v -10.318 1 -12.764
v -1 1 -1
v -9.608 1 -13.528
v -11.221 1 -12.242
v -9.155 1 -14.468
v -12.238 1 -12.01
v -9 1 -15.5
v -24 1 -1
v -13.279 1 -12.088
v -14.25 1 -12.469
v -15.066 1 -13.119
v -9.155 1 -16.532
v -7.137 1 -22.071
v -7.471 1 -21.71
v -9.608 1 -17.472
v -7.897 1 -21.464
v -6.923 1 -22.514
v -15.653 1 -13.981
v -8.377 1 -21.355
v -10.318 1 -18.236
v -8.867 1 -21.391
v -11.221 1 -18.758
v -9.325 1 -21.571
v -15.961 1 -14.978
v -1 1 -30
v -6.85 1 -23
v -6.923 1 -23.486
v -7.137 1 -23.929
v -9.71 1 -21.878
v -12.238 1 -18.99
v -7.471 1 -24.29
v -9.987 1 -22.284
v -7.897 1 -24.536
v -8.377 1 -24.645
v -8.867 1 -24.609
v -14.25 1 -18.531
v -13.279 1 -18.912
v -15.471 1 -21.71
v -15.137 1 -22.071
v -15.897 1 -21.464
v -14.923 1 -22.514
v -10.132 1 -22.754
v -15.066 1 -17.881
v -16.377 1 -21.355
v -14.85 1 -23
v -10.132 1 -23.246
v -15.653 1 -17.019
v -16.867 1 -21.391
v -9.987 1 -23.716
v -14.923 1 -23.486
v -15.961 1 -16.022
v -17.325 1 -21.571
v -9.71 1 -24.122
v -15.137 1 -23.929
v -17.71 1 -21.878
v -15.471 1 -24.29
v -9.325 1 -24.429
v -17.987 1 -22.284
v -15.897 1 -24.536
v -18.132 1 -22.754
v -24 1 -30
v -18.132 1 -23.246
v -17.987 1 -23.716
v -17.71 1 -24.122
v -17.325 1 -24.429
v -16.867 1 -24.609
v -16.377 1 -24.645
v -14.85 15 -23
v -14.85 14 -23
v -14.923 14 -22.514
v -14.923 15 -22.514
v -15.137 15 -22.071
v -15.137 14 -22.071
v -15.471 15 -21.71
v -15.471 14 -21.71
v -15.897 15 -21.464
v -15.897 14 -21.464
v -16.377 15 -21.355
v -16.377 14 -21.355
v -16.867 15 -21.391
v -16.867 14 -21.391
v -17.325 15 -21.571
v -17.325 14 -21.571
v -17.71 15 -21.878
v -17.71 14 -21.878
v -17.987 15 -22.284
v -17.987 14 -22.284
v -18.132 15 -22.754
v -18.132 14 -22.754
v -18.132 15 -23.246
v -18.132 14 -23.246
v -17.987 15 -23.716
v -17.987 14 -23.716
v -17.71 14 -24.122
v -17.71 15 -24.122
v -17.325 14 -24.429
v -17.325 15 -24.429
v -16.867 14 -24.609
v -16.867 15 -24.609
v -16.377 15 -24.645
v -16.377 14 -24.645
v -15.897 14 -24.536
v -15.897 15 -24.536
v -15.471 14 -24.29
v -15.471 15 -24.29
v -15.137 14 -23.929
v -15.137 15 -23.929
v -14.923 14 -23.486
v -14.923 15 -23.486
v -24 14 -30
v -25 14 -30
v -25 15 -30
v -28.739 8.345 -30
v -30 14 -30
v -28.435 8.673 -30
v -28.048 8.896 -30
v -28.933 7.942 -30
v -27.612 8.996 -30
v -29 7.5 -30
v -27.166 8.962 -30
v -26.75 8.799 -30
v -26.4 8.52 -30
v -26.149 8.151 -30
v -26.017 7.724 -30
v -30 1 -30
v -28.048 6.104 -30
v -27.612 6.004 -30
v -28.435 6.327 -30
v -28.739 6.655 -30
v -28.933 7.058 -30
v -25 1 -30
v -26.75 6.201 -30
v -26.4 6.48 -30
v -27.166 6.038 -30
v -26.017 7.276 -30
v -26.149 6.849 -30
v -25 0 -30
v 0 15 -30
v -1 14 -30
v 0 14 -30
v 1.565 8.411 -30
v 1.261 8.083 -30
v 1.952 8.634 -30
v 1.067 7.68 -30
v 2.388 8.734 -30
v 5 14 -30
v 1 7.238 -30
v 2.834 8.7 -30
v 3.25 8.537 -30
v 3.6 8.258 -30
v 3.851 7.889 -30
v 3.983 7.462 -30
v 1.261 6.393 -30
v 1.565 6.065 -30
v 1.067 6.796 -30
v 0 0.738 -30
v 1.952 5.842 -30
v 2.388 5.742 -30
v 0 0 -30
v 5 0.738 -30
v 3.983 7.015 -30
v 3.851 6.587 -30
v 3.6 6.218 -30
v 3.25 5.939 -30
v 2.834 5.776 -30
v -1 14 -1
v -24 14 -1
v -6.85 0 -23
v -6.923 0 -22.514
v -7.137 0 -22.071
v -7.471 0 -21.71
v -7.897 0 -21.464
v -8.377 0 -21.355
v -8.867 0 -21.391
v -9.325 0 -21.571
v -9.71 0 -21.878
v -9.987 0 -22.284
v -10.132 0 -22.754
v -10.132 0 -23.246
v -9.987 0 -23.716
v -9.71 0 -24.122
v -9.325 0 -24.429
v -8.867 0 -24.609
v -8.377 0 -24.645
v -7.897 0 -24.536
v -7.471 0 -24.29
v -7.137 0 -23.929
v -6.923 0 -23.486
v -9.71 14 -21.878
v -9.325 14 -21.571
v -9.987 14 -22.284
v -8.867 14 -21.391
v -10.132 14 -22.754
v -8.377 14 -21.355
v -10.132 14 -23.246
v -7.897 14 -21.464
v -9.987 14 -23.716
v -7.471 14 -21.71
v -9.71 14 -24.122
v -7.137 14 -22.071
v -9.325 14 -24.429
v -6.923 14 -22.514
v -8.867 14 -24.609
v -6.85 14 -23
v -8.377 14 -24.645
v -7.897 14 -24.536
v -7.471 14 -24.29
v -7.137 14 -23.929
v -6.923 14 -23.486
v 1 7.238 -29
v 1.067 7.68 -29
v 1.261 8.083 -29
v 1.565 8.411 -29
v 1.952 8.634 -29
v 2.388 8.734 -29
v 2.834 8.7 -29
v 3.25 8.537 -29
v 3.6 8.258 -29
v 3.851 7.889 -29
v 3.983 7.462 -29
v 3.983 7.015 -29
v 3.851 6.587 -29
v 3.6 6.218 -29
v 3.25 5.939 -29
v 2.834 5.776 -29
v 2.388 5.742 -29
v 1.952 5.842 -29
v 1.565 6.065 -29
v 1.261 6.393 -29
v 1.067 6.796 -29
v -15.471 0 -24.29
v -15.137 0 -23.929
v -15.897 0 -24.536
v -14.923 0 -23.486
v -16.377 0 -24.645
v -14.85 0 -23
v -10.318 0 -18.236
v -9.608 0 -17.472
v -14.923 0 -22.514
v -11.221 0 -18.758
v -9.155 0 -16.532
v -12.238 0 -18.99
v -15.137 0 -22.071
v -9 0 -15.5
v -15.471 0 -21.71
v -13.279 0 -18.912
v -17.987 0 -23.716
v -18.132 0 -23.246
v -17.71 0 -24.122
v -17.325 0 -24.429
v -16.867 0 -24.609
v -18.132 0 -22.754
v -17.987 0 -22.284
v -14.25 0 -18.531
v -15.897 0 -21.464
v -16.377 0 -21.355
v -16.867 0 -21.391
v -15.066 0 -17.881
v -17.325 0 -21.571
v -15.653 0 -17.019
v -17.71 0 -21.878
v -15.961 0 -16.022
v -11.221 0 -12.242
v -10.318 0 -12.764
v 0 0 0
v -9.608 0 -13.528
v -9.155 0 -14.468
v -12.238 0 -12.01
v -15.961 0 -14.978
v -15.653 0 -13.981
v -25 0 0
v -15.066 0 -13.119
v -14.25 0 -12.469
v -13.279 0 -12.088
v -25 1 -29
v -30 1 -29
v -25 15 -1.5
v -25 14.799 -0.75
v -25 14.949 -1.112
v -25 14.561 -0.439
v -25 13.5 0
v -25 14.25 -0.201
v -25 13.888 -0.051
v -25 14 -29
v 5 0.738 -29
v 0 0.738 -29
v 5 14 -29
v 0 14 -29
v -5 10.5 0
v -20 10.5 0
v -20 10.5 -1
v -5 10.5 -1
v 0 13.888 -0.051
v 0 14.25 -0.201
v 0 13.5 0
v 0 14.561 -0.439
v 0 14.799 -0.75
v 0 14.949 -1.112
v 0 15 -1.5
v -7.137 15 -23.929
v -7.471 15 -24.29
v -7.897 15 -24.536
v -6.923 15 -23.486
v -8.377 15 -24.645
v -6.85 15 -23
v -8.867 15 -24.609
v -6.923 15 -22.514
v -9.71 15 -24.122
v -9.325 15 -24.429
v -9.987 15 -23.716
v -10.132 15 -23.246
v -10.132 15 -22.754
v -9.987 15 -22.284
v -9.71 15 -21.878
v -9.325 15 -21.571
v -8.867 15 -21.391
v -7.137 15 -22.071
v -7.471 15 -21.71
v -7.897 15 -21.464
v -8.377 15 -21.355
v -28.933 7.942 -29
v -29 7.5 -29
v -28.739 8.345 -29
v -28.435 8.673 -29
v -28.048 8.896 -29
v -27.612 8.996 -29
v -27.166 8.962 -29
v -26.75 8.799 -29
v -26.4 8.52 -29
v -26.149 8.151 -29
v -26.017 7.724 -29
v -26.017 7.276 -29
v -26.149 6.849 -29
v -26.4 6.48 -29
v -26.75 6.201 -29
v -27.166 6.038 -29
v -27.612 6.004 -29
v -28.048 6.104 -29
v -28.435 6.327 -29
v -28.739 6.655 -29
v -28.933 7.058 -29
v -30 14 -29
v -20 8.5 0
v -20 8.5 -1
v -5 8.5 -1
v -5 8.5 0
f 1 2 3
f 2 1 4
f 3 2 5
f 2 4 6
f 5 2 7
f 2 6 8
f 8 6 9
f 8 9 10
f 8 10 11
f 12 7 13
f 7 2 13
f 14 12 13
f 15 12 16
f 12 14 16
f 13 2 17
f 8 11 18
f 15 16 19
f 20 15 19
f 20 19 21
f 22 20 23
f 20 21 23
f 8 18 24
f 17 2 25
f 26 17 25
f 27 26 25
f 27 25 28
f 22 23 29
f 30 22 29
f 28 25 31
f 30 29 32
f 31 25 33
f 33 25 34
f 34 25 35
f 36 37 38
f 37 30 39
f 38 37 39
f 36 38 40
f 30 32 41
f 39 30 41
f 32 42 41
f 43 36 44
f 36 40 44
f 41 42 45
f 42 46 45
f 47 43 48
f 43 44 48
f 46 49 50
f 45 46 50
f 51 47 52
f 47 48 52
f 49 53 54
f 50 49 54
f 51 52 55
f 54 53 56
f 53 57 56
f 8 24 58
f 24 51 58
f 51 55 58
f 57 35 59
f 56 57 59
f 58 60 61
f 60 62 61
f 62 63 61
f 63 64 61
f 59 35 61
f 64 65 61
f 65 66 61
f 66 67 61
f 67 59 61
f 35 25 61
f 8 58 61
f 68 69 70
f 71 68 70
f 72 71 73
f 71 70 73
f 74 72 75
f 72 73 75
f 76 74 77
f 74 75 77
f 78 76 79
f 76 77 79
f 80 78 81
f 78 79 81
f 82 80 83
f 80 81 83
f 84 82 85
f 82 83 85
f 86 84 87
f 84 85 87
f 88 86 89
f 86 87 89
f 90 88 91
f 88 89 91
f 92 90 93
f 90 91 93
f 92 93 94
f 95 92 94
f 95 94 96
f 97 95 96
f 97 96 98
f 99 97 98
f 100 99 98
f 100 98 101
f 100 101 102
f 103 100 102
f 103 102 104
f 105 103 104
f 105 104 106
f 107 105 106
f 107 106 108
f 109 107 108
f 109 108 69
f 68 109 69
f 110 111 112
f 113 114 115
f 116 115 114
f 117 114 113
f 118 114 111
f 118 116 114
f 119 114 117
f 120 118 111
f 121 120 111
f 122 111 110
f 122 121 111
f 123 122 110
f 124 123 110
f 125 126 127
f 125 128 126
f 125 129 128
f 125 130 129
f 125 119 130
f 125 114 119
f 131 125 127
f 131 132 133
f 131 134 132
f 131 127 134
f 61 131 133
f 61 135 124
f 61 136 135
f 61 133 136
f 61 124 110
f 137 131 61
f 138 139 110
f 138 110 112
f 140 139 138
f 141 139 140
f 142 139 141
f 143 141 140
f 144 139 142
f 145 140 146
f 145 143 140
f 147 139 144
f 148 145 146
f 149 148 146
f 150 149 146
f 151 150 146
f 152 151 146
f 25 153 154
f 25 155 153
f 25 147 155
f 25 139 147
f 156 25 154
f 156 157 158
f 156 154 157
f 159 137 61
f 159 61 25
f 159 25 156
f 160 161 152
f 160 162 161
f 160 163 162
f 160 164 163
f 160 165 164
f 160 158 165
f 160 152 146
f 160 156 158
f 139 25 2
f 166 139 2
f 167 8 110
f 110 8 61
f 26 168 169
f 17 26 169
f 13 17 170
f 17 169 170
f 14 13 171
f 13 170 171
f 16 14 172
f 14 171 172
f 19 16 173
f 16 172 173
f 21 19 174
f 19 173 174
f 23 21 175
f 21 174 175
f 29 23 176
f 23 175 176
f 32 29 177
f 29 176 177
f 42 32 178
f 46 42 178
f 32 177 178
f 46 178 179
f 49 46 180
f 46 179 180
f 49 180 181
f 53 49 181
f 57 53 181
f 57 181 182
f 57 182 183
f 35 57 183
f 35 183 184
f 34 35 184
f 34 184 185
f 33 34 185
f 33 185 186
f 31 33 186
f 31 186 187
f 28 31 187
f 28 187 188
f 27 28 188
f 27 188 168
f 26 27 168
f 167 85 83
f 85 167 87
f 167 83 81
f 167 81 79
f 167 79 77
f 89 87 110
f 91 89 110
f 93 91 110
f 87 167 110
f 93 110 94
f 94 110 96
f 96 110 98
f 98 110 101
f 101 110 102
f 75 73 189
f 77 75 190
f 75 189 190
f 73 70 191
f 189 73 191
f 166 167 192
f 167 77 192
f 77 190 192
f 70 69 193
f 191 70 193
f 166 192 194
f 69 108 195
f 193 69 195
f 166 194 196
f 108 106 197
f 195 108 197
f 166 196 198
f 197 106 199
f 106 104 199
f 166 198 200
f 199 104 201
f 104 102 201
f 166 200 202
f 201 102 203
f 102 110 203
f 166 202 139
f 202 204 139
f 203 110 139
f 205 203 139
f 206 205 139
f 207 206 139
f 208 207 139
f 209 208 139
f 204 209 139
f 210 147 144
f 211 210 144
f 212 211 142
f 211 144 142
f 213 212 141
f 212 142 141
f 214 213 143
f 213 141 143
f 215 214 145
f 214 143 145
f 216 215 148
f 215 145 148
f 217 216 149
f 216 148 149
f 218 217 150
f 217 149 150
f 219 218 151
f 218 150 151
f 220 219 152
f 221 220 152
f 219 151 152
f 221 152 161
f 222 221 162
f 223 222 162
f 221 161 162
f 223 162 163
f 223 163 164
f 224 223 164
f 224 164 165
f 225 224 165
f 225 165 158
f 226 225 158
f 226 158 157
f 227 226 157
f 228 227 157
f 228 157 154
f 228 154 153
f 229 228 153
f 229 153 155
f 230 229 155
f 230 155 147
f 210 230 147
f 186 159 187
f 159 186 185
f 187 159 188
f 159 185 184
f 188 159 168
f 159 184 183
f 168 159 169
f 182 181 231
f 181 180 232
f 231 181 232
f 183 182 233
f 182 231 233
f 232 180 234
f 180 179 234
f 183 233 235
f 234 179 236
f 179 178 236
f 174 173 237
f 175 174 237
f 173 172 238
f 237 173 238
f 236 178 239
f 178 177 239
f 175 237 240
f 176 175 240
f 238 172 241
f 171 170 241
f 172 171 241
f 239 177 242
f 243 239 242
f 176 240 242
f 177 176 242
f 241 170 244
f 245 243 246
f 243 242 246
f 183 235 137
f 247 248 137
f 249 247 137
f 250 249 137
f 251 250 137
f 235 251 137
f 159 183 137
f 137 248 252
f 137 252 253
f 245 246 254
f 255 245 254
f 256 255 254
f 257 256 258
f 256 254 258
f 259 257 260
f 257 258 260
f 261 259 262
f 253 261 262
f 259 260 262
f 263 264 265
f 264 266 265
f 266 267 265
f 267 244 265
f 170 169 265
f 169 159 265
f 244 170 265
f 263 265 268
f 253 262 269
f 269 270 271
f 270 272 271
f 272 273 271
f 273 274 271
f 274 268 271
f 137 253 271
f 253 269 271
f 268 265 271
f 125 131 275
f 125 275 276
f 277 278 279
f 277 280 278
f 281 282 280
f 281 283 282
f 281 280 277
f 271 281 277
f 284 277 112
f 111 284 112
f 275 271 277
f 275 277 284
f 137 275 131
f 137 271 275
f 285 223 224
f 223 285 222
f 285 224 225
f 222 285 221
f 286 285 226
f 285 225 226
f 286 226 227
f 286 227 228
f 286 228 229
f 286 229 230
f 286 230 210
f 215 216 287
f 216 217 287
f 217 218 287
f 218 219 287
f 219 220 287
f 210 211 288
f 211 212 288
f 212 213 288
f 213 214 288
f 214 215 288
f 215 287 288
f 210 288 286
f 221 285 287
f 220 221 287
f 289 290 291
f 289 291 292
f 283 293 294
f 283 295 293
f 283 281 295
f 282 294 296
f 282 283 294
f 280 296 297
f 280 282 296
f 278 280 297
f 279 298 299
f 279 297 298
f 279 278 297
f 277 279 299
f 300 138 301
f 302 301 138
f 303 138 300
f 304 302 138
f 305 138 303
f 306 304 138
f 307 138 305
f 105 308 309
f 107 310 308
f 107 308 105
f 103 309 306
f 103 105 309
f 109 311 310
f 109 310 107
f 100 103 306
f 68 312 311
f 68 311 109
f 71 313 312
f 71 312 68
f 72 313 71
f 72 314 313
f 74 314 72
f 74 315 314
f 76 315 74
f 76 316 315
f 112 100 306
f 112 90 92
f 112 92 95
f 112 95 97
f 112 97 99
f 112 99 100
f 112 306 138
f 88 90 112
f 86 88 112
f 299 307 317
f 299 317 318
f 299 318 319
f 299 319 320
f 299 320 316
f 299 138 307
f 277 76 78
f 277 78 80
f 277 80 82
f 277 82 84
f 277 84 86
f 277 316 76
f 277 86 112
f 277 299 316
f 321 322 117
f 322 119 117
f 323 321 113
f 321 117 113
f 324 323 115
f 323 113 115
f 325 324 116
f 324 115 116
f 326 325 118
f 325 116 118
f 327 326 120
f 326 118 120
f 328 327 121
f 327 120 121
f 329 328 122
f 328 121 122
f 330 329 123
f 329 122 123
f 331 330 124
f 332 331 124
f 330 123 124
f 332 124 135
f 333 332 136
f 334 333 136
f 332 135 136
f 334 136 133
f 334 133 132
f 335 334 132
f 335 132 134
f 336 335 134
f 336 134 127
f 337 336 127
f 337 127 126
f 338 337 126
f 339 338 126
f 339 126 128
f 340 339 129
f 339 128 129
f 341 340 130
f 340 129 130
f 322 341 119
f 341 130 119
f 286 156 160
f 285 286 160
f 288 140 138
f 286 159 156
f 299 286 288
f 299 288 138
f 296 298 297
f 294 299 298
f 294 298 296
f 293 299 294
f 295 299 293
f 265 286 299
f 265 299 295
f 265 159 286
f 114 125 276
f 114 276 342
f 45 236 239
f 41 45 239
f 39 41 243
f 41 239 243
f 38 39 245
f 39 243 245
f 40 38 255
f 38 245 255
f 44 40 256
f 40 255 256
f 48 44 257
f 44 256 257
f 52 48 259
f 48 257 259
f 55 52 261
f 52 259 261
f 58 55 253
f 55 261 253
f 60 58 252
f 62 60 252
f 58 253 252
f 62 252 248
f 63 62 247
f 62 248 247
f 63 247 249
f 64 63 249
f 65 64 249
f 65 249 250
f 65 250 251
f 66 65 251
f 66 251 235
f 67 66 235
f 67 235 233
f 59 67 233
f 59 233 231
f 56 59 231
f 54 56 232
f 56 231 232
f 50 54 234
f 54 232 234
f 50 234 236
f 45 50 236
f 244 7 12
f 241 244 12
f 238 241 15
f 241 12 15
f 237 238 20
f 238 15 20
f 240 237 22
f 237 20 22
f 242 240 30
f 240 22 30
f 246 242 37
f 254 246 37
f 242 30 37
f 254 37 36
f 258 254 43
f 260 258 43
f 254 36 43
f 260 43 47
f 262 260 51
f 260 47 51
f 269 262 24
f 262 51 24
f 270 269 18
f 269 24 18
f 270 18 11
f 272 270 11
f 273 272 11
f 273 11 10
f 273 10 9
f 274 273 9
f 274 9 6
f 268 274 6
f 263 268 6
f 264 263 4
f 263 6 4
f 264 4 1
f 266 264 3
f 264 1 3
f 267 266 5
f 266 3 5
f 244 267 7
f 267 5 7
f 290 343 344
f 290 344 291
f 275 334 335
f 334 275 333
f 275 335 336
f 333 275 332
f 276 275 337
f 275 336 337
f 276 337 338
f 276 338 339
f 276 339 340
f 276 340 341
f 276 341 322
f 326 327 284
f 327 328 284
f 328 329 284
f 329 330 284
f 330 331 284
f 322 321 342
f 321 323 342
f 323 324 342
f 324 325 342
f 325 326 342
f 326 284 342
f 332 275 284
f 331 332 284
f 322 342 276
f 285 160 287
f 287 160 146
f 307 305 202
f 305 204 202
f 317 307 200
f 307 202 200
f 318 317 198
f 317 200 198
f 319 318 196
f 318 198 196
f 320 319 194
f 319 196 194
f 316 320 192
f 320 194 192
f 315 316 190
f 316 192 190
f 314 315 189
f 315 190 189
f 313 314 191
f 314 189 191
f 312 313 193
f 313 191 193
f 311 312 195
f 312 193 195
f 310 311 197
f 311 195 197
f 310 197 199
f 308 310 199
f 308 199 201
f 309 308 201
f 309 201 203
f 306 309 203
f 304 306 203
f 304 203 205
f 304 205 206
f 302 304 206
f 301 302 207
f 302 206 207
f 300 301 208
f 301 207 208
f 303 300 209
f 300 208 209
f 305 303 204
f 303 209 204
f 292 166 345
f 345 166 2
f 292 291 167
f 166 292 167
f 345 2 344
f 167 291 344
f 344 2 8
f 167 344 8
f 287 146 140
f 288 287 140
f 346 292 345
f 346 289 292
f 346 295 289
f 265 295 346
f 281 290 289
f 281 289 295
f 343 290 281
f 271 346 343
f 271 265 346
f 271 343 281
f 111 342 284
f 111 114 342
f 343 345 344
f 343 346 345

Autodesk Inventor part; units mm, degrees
ref_plane "YZ Plane" through (0, 0, 0) normal (1, 0, 0) x (0, 1, 0)
ref_plane "XZ Plane" through (0, 0, 0) normal (0, 1, 0) x (-1, 0, 0)
ref_plane "XY Plane" through (0, 0, 0) normal (0, 0, 1) x (1, 0, 0)
sketch "Esboço1" plane through (0, 0, 0) normal (0, 1, 0) x (-1, 0, 0)
  line L0 (0, 0) -> (25, 0)
  line L1 (25, 0) -> (25, -30)
  line L2 (25, -30) -> (0, -30)
  line L3 (0, -30) -> (0, 0)
  dimension "d0" = 25
  dimension "d1" = 30
extrude "Extrusão1" add sketch "Esboço1" along normal blind 15
shell "Casca1" thickness 1 removed faces 1 at (-8.3333, 15, -10)
sketch "Esboço4" plane through (-24, 1, -1) normal (0, 1, 0) x (1, 0, 0)
  line L0 (24, 29) -> (-1, 29) projected
  line L1 (-1, 29) -> (-1, -1) projected
  circle A0 centre (11.5, 14.5) radius 3.5
  point P0 (24, -1)
  point P1 (1, 29)
  dimension "d17" = 7
  dimension "d20" = 12.5
  dimension "d21" = 14.5
extrude "Extrusão4" cut sketch "Esboço4" against normal blind 5
sketch "Esboço10" plane through (0, 0, 0) normal (0, -1, 0) x (1, 0, 0)
  circle A0 centre (-12.5, -15.5) radius 3.5 projected
  circle A1 centre (-16.5, -23) radius 1.65
  circle A2 centre (-8.5, -23) radius 1.65
  point P0 (0, 0)
  dimension "d72" = 3.3
  dimension "d73" = 3.3
  dimension "d113" = 7.5
  dimension "d114" = 4
extrude "Extrusão10" cut sketch "Esboço10" against normal blind 10 contours A1 | A2
sketch "Esboço11" plane through (0, 0, -30) normal (0, 0, -1) x (-1, 0, 0)
  line L0 (1, 1) -> (1, 15) projected
  line L1 (24, 1) -> (24, 15) projected
  line L2 (1, 1) -> (24, 1)
  line L3 (24, 1) -> (24, 14)
  line L4 (24, 14) -> (1, 14)
  line L5 (1, 14) -> (1, 1)
  line L6 (0, 15) -> (25, 15) projected
  point P0 (0, 0)
  dimension "d80" = 1
extrude "Extrusão11" cut sketch "Esboço11" against normal blind 10 contours L0 L4 L1 L2
sketch "Esboço12" plane through (-1, 1, -1) normal (0, 0, -1) x (-1, 0, 0)
  line L0 (0, 13) -> (0, 14) projected
  line L1 (0, 14) -> (23, 14)
  line L2 (23, 14) -> (23, 13)
  line L3 (23, 13) -> (0, 13)
  line L4 (0, 13) -> (0, 14)
  point P0 (-1, -1)
extrude "Extrusão12" add sketch "Esboço12" along normal up to surface (28 mm away)
sketch "Esboço13" plane through (0, 0, 0) normal (0, -1, 0) x (1, 0, 0)
  circle A0 centre (-16.5, -23) radius 1.65 projected
  circle A1 centre (-16.5, -23) radius 1.65
  circle A2 centre (-8.5, -23) radius 1.65 projected
  circle A3 centre (-8.5, -23) radius 1.65
  point P0 (0, 0)
extrude "Extrusão13" cut sketch "Esboço13" against normal up to surface (15 mm away)
sketch "Esboço14" plane through (0, 0, -30) normal (0, 0, -1) x (-1, 0, 0)
  line L0 (0, 0.7381) -> (-5, 0.7381)
  line L1 (-5, 0.7381) -> (-5, 14)
  line L2 (-5, 14) -> (0, 14)
  line L3 (0, 14) -> (0, 0.7381)
  line L4 (1, 14) -> (24, 14) projected
  line L5 (25, 0) -> (25, 15) projected
  line L6 (25, 1) -> (30, 1)
  line L7 (30, 1) -> (30, 14)
  line L8 (30, 14) -> (25, 14)
  line L9 (25, 14) -> (25, 1)
  line L10 (24, 1) -> (1, 1) projected
  point P0 (0, 0)
  dimension "d88" = 5
  dimension "d89" = 0
  dimension "d90" = 5
  dimension "d91" = 0
  dimension "d92" = 0
extrude "Extrusão14" add sketch "Esboço14" against normal blind 1
sketch "Esboço15" plane through (0, 0, -30) normal (0, 0, -1) x (-1, 0, 0)
  circle A0 centre (27.5, 7.5) radius 1.5
  circle A1 centre (-2.5, 7.2381) radius 1.5
  line L0 (25, 1) -> (30, 1) projected
  line L1 (0, 0.7381) -> (-5, 0.7381) projected
  line L2 (-5, 0.7381) -> (-5, 14) projected
  line L3 (30, 1) -> (30, 14) projected
  point P0 (0, 0)
  dimension "d95" = 3
  dimension "d96" = 3
  dimension "d97" = 6.5
  dimension "d98" = 6.5
  dimension "d99" = 2.5
  dimension "d100" = 2.5
extrude "Extrusão15" cut sketch "Esboço15" against normal blind 1
fillet "Arredondamento4" radius 1.5 1 edges at (-12.5, 15, 0)
sketch "Esboço16" plane through (-25, 0, 0) normal (0, 0, 1) x (1, 0, 0)
  line L0 (5, 10.5) -> (20, 10.5)
  line L1 (20, 10.5) -> (20, 8.5)
  line L2 (20, 8.5) -> (5, 8.5)
  line L3 (5, 8.5) -> (5, 10.5)
  line L4 (25, 0) -> (25, 13.5) projected
  line L5 (0, 13.5) -> (25, 13.5) projected
  dimension "d115" = 15
  dimension "d116" = 2
  dimension "d117" = 5
  dimension "d118" = 3
extrude "Extrusão16" cut sketch "Esboço16" against normal blind 1
properties part number "Caixa do sensor de temperatura"
